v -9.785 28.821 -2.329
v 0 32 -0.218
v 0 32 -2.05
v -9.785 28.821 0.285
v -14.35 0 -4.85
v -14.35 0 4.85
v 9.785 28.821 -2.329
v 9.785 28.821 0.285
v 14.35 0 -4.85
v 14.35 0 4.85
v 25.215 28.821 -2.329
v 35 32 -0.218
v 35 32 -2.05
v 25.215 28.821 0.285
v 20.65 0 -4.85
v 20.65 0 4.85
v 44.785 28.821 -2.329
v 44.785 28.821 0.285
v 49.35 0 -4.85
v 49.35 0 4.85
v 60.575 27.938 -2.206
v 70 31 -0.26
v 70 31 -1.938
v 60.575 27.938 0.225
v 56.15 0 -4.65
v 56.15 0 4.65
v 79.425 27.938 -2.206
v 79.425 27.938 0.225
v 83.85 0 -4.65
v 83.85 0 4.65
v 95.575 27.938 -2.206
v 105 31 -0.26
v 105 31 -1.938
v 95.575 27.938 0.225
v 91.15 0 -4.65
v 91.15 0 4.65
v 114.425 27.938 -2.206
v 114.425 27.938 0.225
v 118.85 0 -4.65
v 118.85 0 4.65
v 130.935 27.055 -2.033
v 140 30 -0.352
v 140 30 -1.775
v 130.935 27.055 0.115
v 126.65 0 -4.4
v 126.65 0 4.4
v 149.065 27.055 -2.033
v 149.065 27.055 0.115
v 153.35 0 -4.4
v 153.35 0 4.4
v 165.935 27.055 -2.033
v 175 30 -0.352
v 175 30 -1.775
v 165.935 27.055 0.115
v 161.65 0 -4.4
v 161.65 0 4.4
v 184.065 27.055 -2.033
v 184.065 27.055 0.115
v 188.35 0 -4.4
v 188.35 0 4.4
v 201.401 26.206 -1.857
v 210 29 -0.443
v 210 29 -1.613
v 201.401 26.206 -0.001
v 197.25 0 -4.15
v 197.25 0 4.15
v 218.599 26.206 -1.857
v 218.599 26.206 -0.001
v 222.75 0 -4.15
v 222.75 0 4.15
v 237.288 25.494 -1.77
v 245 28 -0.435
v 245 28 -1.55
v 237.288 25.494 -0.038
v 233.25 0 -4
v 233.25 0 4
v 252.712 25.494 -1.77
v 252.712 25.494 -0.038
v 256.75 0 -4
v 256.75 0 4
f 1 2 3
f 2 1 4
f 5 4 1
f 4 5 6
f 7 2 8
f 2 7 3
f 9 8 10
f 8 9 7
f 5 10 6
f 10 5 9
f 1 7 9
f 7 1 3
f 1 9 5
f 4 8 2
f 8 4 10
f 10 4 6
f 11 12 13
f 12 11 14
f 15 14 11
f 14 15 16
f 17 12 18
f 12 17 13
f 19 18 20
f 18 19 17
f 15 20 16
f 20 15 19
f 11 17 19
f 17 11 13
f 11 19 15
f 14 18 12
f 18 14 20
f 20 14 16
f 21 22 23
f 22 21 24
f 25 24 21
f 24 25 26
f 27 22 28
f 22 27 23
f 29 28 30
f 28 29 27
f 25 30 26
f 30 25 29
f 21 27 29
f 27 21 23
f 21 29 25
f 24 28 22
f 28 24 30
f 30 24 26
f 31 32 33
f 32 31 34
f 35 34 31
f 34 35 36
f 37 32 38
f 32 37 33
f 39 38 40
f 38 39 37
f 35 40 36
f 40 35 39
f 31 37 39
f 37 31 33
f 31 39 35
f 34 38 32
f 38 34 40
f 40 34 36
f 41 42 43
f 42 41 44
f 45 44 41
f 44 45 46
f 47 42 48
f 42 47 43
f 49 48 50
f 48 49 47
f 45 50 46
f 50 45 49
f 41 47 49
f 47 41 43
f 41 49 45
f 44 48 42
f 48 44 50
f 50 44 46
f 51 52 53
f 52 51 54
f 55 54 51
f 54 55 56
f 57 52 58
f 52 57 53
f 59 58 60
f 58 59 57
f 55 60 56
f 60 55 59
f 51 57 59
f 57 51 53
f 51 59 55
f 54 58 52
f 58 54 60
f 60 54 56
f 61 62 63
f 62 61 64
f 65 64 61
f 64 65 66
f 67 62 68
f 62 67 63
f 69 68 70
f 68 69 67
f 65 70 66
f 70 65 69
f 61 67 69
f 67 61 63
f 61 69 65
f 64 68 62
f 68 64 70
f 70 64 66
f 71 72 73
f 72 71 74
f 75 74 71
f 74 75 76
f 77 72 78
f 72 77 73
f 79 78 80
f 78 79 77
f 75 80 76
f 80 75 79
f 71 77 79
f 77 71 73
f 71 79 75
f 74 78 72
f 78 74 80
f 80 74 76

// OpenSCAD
// Gemini-generated OpenSCAD script for Shogi Pieces
//
// This script generates a set of Shogi (Japanese chess) pieces suitable for 3D printing.
// You can generate a specific piece by name or all pieces at once.

// --- Parameters ---

// Name of the piece to generate. Set to "All" to generate all pieces.
// Available pieces: "Osho", "Gyokusho", "Hisha", "Kakugyo", "Kinsho", "Ginsho", "Keima", "Kyosha"
piece_to_generate = "All";

// --- Data ---

// Piece data derived from the provided 'piece-measurements.csv'.
// Format: [Name, Height (mm), Width (mm), Max Thickness (mm)]
PIECE_DATA = [
  ["Osho",     32.0, 28.7, 9.7],
  ["Gyokusho", 32.0, 28.7, 9.7],
  ["Hisha",    31.0, 27.7, 9.3],
  ["Kakugyo",  31.0, 27.7, 9.3],
  ["Kinsho",   30.0, 26.7, 8.8],
  ["Ginsho",   30.0, 26.7, 8.8],
  ["Keima",    29.0, 25.5, 8.3],
  ["Kyosha",   28.0, 23.5, 8.0]
];

// Angles from the provided reference images.
// These angles are consistent across all specified piece types.
ANGLE_FRONT_BOTTOM = 81;   // Angle at the base of the front pentagon.
ANGLE_FRONT_SIDE = 117;    // Angle at the "shoulder" of the pentagon.
ANGLE_FRONT_TOP = 144;     // Angle at the tip of the front pentagon (implicit in calculation).
ANGLE_SIDE_1 = 81;         // First angle of the side profile base.
ANGLE_SIDE_2 = 85;         // Second angle of the side profile base.


// --- Main Logic ---

// Find the index of the selected piece.
piece_index = -1;
for (i = [0:len(PIECE_DATA)-1]) {
  if (PIECE_DATA[i][0] == piece_to_generate) {
    piece_index = i;
  }
}

// Generate the selected piece or all pieces.
if (piece_to_generate == "All") {
  echo("Generating all Shogi pieces.");
  spacing = 35; // Space between pieces when generating all
  for (i = [0:len(PIECE_DATA)-1]) {
    translate([i * spacing, 0, 0]) {
      shogi_piece_from_index(i);
    }
  }
} else if (piece_index != -1) {
  echo("Generating piece:", piece_to_generate);
  shogi_piece_from_index(piece_index);
} else {
  echo("Error: Piece not found -", piece_to_generate);
  echo("Please choose from 'All', 'Osho', 'Gyokusho', 'Hisha', 'Kakugyo', 'Kinsho', 'Ginsho', 'Keima', 'Kyosha'.");
}


// --- Modules & Functions ---

// Module to generate a shogi piece by its index in the PIECE_DATA array.
module shogi_piece_from_index(index) {
  data = PIECE_DATA[index];
  name = data[0];
  height = data[1];
  width = data[2];
  thickness = data[3];

  shogi_piece(width, height, thickness);
}

// Core module to create a single Shogi piece.
// The piece is created by intersecting two extruded shapes:
// 1. The front-view pentagonal profile extruded along the Y-axis (thickness).
// 2. The side-view trapezoidal profile extruded along the X-axis (width).
// The piece is centered at the origin.
module shogi_piece(W, H, T) {
  intersection() {
    // Front Profile: A pentagon in the X-Z plane, extruded along Y.
    linear_extrude(height = T, center = true) {
      polygon(get_front_pentagon_points(W, H));
    }

    // Side Profile: A trapezoid in the Y-Z plane, extruded along X.
    // It's rotated into position to align with the Y-Z plane before extrusion.
    rotate([0, 90, 0]) {
      linear_extrude(height = W, center = true) {
        polygon(get_side_trapezoid_points(H, T));
      }
    }
  }
}

// Function to calculate the vertices of the front pentagon.
// The pentagon lies in the X-Z plane, centered horizontally.
// This calculation ensures all angles (81, 117 degrees) and dimensions (W, H) are respected.
// @param W The width of the base of the piece.
// @param H The total height of the piece.
// @return An array of 5 points defining the pentagon.
function get_front_pentagon_points(W, H) =
  let (
    // Angles of the vectors based on turtle-style drawing from the bottom-right corner.
    heading1 = 180 - ANGLE_FRONT_BOTTOM,               // Heading for the side flank (99 deg).
    heading2 = heading1 + (180 - ANGLE_FRONT_SIDE),    // Heading for the top flank (162 deg).

    // We solve a 2x2 system of linear equations to find the lengths of the
    // side flank (L1) and top flank (L2) based on the total width and height.
    // L1*cos(h1) + L2*cos(h2) = -W/2
    // L1*sin(h1) + L2*sin(h2) = H
    a = cos(heading1), b = cos(heading2), c = -W/2,
    d = sin(heading1), e = sin(heading2), f = H,

    // Solve for lengths L1 and L2 using Cramer's rule.
    det = a * e - b * d, // Determinant of the system.
    L1 = (c * e - b * f) / det,
    L2 = (a * f - c * d) / det,

    // Calculate the coordinates of the top-right "shoulder" point.
    p_br = [W/2, 0],
    p_tr_x = p_br[0] + L1 * cos(heading1),
    p_tr_z = p_br[1] + L1 * sin(heading1),

    // Define all 5 vertices of the pentagon using symmetry.
    p_bl = [-W/2, 0],
    p_tr = [p_tr_x, p_tr_z],
    p_top = [0, H],
    p_tl = [-p_tr_x, p_tr_z]
  )
  // Return points in order suitable for the polygon() function.
  [p_bl, p_br, p_tr, p_top, p_tl];

// Function to calculate the vertices of the side profile trapezoid.
// The trapezoid lies in the Y-Z plane, centered horizontally at the base.
// @param H The total height of the piece.
// @param T The maximum thickness (base width) of the piece.
// @return An array of 4 points defining the trapezoid.
function get_side_trapezoid_points(H, T) =
  let (
    // Calculate the top-left and top-right Y coordinates based on the base
    // angles, creating the non-symmetrical taper.
    y_tl = -T/2 + H / tan(ANGLE_SIDE_1),
    y_tr = T/2 - H / tan(ANGLE_SIDE_2),

    // Define the 4 vertices of the trapezoid.
    p_bl = [-T/2, 0],   // Bottom-left
    p_br = [T/2, 0],    // Bottom-right
    p_tr = [y_tr, H],   // Top-right
    p_tl = [y_tl, H]    // Top-left
  )
  // Return points in order for polygon().
  [p_bl, p_br, p_tr, p_tl];
